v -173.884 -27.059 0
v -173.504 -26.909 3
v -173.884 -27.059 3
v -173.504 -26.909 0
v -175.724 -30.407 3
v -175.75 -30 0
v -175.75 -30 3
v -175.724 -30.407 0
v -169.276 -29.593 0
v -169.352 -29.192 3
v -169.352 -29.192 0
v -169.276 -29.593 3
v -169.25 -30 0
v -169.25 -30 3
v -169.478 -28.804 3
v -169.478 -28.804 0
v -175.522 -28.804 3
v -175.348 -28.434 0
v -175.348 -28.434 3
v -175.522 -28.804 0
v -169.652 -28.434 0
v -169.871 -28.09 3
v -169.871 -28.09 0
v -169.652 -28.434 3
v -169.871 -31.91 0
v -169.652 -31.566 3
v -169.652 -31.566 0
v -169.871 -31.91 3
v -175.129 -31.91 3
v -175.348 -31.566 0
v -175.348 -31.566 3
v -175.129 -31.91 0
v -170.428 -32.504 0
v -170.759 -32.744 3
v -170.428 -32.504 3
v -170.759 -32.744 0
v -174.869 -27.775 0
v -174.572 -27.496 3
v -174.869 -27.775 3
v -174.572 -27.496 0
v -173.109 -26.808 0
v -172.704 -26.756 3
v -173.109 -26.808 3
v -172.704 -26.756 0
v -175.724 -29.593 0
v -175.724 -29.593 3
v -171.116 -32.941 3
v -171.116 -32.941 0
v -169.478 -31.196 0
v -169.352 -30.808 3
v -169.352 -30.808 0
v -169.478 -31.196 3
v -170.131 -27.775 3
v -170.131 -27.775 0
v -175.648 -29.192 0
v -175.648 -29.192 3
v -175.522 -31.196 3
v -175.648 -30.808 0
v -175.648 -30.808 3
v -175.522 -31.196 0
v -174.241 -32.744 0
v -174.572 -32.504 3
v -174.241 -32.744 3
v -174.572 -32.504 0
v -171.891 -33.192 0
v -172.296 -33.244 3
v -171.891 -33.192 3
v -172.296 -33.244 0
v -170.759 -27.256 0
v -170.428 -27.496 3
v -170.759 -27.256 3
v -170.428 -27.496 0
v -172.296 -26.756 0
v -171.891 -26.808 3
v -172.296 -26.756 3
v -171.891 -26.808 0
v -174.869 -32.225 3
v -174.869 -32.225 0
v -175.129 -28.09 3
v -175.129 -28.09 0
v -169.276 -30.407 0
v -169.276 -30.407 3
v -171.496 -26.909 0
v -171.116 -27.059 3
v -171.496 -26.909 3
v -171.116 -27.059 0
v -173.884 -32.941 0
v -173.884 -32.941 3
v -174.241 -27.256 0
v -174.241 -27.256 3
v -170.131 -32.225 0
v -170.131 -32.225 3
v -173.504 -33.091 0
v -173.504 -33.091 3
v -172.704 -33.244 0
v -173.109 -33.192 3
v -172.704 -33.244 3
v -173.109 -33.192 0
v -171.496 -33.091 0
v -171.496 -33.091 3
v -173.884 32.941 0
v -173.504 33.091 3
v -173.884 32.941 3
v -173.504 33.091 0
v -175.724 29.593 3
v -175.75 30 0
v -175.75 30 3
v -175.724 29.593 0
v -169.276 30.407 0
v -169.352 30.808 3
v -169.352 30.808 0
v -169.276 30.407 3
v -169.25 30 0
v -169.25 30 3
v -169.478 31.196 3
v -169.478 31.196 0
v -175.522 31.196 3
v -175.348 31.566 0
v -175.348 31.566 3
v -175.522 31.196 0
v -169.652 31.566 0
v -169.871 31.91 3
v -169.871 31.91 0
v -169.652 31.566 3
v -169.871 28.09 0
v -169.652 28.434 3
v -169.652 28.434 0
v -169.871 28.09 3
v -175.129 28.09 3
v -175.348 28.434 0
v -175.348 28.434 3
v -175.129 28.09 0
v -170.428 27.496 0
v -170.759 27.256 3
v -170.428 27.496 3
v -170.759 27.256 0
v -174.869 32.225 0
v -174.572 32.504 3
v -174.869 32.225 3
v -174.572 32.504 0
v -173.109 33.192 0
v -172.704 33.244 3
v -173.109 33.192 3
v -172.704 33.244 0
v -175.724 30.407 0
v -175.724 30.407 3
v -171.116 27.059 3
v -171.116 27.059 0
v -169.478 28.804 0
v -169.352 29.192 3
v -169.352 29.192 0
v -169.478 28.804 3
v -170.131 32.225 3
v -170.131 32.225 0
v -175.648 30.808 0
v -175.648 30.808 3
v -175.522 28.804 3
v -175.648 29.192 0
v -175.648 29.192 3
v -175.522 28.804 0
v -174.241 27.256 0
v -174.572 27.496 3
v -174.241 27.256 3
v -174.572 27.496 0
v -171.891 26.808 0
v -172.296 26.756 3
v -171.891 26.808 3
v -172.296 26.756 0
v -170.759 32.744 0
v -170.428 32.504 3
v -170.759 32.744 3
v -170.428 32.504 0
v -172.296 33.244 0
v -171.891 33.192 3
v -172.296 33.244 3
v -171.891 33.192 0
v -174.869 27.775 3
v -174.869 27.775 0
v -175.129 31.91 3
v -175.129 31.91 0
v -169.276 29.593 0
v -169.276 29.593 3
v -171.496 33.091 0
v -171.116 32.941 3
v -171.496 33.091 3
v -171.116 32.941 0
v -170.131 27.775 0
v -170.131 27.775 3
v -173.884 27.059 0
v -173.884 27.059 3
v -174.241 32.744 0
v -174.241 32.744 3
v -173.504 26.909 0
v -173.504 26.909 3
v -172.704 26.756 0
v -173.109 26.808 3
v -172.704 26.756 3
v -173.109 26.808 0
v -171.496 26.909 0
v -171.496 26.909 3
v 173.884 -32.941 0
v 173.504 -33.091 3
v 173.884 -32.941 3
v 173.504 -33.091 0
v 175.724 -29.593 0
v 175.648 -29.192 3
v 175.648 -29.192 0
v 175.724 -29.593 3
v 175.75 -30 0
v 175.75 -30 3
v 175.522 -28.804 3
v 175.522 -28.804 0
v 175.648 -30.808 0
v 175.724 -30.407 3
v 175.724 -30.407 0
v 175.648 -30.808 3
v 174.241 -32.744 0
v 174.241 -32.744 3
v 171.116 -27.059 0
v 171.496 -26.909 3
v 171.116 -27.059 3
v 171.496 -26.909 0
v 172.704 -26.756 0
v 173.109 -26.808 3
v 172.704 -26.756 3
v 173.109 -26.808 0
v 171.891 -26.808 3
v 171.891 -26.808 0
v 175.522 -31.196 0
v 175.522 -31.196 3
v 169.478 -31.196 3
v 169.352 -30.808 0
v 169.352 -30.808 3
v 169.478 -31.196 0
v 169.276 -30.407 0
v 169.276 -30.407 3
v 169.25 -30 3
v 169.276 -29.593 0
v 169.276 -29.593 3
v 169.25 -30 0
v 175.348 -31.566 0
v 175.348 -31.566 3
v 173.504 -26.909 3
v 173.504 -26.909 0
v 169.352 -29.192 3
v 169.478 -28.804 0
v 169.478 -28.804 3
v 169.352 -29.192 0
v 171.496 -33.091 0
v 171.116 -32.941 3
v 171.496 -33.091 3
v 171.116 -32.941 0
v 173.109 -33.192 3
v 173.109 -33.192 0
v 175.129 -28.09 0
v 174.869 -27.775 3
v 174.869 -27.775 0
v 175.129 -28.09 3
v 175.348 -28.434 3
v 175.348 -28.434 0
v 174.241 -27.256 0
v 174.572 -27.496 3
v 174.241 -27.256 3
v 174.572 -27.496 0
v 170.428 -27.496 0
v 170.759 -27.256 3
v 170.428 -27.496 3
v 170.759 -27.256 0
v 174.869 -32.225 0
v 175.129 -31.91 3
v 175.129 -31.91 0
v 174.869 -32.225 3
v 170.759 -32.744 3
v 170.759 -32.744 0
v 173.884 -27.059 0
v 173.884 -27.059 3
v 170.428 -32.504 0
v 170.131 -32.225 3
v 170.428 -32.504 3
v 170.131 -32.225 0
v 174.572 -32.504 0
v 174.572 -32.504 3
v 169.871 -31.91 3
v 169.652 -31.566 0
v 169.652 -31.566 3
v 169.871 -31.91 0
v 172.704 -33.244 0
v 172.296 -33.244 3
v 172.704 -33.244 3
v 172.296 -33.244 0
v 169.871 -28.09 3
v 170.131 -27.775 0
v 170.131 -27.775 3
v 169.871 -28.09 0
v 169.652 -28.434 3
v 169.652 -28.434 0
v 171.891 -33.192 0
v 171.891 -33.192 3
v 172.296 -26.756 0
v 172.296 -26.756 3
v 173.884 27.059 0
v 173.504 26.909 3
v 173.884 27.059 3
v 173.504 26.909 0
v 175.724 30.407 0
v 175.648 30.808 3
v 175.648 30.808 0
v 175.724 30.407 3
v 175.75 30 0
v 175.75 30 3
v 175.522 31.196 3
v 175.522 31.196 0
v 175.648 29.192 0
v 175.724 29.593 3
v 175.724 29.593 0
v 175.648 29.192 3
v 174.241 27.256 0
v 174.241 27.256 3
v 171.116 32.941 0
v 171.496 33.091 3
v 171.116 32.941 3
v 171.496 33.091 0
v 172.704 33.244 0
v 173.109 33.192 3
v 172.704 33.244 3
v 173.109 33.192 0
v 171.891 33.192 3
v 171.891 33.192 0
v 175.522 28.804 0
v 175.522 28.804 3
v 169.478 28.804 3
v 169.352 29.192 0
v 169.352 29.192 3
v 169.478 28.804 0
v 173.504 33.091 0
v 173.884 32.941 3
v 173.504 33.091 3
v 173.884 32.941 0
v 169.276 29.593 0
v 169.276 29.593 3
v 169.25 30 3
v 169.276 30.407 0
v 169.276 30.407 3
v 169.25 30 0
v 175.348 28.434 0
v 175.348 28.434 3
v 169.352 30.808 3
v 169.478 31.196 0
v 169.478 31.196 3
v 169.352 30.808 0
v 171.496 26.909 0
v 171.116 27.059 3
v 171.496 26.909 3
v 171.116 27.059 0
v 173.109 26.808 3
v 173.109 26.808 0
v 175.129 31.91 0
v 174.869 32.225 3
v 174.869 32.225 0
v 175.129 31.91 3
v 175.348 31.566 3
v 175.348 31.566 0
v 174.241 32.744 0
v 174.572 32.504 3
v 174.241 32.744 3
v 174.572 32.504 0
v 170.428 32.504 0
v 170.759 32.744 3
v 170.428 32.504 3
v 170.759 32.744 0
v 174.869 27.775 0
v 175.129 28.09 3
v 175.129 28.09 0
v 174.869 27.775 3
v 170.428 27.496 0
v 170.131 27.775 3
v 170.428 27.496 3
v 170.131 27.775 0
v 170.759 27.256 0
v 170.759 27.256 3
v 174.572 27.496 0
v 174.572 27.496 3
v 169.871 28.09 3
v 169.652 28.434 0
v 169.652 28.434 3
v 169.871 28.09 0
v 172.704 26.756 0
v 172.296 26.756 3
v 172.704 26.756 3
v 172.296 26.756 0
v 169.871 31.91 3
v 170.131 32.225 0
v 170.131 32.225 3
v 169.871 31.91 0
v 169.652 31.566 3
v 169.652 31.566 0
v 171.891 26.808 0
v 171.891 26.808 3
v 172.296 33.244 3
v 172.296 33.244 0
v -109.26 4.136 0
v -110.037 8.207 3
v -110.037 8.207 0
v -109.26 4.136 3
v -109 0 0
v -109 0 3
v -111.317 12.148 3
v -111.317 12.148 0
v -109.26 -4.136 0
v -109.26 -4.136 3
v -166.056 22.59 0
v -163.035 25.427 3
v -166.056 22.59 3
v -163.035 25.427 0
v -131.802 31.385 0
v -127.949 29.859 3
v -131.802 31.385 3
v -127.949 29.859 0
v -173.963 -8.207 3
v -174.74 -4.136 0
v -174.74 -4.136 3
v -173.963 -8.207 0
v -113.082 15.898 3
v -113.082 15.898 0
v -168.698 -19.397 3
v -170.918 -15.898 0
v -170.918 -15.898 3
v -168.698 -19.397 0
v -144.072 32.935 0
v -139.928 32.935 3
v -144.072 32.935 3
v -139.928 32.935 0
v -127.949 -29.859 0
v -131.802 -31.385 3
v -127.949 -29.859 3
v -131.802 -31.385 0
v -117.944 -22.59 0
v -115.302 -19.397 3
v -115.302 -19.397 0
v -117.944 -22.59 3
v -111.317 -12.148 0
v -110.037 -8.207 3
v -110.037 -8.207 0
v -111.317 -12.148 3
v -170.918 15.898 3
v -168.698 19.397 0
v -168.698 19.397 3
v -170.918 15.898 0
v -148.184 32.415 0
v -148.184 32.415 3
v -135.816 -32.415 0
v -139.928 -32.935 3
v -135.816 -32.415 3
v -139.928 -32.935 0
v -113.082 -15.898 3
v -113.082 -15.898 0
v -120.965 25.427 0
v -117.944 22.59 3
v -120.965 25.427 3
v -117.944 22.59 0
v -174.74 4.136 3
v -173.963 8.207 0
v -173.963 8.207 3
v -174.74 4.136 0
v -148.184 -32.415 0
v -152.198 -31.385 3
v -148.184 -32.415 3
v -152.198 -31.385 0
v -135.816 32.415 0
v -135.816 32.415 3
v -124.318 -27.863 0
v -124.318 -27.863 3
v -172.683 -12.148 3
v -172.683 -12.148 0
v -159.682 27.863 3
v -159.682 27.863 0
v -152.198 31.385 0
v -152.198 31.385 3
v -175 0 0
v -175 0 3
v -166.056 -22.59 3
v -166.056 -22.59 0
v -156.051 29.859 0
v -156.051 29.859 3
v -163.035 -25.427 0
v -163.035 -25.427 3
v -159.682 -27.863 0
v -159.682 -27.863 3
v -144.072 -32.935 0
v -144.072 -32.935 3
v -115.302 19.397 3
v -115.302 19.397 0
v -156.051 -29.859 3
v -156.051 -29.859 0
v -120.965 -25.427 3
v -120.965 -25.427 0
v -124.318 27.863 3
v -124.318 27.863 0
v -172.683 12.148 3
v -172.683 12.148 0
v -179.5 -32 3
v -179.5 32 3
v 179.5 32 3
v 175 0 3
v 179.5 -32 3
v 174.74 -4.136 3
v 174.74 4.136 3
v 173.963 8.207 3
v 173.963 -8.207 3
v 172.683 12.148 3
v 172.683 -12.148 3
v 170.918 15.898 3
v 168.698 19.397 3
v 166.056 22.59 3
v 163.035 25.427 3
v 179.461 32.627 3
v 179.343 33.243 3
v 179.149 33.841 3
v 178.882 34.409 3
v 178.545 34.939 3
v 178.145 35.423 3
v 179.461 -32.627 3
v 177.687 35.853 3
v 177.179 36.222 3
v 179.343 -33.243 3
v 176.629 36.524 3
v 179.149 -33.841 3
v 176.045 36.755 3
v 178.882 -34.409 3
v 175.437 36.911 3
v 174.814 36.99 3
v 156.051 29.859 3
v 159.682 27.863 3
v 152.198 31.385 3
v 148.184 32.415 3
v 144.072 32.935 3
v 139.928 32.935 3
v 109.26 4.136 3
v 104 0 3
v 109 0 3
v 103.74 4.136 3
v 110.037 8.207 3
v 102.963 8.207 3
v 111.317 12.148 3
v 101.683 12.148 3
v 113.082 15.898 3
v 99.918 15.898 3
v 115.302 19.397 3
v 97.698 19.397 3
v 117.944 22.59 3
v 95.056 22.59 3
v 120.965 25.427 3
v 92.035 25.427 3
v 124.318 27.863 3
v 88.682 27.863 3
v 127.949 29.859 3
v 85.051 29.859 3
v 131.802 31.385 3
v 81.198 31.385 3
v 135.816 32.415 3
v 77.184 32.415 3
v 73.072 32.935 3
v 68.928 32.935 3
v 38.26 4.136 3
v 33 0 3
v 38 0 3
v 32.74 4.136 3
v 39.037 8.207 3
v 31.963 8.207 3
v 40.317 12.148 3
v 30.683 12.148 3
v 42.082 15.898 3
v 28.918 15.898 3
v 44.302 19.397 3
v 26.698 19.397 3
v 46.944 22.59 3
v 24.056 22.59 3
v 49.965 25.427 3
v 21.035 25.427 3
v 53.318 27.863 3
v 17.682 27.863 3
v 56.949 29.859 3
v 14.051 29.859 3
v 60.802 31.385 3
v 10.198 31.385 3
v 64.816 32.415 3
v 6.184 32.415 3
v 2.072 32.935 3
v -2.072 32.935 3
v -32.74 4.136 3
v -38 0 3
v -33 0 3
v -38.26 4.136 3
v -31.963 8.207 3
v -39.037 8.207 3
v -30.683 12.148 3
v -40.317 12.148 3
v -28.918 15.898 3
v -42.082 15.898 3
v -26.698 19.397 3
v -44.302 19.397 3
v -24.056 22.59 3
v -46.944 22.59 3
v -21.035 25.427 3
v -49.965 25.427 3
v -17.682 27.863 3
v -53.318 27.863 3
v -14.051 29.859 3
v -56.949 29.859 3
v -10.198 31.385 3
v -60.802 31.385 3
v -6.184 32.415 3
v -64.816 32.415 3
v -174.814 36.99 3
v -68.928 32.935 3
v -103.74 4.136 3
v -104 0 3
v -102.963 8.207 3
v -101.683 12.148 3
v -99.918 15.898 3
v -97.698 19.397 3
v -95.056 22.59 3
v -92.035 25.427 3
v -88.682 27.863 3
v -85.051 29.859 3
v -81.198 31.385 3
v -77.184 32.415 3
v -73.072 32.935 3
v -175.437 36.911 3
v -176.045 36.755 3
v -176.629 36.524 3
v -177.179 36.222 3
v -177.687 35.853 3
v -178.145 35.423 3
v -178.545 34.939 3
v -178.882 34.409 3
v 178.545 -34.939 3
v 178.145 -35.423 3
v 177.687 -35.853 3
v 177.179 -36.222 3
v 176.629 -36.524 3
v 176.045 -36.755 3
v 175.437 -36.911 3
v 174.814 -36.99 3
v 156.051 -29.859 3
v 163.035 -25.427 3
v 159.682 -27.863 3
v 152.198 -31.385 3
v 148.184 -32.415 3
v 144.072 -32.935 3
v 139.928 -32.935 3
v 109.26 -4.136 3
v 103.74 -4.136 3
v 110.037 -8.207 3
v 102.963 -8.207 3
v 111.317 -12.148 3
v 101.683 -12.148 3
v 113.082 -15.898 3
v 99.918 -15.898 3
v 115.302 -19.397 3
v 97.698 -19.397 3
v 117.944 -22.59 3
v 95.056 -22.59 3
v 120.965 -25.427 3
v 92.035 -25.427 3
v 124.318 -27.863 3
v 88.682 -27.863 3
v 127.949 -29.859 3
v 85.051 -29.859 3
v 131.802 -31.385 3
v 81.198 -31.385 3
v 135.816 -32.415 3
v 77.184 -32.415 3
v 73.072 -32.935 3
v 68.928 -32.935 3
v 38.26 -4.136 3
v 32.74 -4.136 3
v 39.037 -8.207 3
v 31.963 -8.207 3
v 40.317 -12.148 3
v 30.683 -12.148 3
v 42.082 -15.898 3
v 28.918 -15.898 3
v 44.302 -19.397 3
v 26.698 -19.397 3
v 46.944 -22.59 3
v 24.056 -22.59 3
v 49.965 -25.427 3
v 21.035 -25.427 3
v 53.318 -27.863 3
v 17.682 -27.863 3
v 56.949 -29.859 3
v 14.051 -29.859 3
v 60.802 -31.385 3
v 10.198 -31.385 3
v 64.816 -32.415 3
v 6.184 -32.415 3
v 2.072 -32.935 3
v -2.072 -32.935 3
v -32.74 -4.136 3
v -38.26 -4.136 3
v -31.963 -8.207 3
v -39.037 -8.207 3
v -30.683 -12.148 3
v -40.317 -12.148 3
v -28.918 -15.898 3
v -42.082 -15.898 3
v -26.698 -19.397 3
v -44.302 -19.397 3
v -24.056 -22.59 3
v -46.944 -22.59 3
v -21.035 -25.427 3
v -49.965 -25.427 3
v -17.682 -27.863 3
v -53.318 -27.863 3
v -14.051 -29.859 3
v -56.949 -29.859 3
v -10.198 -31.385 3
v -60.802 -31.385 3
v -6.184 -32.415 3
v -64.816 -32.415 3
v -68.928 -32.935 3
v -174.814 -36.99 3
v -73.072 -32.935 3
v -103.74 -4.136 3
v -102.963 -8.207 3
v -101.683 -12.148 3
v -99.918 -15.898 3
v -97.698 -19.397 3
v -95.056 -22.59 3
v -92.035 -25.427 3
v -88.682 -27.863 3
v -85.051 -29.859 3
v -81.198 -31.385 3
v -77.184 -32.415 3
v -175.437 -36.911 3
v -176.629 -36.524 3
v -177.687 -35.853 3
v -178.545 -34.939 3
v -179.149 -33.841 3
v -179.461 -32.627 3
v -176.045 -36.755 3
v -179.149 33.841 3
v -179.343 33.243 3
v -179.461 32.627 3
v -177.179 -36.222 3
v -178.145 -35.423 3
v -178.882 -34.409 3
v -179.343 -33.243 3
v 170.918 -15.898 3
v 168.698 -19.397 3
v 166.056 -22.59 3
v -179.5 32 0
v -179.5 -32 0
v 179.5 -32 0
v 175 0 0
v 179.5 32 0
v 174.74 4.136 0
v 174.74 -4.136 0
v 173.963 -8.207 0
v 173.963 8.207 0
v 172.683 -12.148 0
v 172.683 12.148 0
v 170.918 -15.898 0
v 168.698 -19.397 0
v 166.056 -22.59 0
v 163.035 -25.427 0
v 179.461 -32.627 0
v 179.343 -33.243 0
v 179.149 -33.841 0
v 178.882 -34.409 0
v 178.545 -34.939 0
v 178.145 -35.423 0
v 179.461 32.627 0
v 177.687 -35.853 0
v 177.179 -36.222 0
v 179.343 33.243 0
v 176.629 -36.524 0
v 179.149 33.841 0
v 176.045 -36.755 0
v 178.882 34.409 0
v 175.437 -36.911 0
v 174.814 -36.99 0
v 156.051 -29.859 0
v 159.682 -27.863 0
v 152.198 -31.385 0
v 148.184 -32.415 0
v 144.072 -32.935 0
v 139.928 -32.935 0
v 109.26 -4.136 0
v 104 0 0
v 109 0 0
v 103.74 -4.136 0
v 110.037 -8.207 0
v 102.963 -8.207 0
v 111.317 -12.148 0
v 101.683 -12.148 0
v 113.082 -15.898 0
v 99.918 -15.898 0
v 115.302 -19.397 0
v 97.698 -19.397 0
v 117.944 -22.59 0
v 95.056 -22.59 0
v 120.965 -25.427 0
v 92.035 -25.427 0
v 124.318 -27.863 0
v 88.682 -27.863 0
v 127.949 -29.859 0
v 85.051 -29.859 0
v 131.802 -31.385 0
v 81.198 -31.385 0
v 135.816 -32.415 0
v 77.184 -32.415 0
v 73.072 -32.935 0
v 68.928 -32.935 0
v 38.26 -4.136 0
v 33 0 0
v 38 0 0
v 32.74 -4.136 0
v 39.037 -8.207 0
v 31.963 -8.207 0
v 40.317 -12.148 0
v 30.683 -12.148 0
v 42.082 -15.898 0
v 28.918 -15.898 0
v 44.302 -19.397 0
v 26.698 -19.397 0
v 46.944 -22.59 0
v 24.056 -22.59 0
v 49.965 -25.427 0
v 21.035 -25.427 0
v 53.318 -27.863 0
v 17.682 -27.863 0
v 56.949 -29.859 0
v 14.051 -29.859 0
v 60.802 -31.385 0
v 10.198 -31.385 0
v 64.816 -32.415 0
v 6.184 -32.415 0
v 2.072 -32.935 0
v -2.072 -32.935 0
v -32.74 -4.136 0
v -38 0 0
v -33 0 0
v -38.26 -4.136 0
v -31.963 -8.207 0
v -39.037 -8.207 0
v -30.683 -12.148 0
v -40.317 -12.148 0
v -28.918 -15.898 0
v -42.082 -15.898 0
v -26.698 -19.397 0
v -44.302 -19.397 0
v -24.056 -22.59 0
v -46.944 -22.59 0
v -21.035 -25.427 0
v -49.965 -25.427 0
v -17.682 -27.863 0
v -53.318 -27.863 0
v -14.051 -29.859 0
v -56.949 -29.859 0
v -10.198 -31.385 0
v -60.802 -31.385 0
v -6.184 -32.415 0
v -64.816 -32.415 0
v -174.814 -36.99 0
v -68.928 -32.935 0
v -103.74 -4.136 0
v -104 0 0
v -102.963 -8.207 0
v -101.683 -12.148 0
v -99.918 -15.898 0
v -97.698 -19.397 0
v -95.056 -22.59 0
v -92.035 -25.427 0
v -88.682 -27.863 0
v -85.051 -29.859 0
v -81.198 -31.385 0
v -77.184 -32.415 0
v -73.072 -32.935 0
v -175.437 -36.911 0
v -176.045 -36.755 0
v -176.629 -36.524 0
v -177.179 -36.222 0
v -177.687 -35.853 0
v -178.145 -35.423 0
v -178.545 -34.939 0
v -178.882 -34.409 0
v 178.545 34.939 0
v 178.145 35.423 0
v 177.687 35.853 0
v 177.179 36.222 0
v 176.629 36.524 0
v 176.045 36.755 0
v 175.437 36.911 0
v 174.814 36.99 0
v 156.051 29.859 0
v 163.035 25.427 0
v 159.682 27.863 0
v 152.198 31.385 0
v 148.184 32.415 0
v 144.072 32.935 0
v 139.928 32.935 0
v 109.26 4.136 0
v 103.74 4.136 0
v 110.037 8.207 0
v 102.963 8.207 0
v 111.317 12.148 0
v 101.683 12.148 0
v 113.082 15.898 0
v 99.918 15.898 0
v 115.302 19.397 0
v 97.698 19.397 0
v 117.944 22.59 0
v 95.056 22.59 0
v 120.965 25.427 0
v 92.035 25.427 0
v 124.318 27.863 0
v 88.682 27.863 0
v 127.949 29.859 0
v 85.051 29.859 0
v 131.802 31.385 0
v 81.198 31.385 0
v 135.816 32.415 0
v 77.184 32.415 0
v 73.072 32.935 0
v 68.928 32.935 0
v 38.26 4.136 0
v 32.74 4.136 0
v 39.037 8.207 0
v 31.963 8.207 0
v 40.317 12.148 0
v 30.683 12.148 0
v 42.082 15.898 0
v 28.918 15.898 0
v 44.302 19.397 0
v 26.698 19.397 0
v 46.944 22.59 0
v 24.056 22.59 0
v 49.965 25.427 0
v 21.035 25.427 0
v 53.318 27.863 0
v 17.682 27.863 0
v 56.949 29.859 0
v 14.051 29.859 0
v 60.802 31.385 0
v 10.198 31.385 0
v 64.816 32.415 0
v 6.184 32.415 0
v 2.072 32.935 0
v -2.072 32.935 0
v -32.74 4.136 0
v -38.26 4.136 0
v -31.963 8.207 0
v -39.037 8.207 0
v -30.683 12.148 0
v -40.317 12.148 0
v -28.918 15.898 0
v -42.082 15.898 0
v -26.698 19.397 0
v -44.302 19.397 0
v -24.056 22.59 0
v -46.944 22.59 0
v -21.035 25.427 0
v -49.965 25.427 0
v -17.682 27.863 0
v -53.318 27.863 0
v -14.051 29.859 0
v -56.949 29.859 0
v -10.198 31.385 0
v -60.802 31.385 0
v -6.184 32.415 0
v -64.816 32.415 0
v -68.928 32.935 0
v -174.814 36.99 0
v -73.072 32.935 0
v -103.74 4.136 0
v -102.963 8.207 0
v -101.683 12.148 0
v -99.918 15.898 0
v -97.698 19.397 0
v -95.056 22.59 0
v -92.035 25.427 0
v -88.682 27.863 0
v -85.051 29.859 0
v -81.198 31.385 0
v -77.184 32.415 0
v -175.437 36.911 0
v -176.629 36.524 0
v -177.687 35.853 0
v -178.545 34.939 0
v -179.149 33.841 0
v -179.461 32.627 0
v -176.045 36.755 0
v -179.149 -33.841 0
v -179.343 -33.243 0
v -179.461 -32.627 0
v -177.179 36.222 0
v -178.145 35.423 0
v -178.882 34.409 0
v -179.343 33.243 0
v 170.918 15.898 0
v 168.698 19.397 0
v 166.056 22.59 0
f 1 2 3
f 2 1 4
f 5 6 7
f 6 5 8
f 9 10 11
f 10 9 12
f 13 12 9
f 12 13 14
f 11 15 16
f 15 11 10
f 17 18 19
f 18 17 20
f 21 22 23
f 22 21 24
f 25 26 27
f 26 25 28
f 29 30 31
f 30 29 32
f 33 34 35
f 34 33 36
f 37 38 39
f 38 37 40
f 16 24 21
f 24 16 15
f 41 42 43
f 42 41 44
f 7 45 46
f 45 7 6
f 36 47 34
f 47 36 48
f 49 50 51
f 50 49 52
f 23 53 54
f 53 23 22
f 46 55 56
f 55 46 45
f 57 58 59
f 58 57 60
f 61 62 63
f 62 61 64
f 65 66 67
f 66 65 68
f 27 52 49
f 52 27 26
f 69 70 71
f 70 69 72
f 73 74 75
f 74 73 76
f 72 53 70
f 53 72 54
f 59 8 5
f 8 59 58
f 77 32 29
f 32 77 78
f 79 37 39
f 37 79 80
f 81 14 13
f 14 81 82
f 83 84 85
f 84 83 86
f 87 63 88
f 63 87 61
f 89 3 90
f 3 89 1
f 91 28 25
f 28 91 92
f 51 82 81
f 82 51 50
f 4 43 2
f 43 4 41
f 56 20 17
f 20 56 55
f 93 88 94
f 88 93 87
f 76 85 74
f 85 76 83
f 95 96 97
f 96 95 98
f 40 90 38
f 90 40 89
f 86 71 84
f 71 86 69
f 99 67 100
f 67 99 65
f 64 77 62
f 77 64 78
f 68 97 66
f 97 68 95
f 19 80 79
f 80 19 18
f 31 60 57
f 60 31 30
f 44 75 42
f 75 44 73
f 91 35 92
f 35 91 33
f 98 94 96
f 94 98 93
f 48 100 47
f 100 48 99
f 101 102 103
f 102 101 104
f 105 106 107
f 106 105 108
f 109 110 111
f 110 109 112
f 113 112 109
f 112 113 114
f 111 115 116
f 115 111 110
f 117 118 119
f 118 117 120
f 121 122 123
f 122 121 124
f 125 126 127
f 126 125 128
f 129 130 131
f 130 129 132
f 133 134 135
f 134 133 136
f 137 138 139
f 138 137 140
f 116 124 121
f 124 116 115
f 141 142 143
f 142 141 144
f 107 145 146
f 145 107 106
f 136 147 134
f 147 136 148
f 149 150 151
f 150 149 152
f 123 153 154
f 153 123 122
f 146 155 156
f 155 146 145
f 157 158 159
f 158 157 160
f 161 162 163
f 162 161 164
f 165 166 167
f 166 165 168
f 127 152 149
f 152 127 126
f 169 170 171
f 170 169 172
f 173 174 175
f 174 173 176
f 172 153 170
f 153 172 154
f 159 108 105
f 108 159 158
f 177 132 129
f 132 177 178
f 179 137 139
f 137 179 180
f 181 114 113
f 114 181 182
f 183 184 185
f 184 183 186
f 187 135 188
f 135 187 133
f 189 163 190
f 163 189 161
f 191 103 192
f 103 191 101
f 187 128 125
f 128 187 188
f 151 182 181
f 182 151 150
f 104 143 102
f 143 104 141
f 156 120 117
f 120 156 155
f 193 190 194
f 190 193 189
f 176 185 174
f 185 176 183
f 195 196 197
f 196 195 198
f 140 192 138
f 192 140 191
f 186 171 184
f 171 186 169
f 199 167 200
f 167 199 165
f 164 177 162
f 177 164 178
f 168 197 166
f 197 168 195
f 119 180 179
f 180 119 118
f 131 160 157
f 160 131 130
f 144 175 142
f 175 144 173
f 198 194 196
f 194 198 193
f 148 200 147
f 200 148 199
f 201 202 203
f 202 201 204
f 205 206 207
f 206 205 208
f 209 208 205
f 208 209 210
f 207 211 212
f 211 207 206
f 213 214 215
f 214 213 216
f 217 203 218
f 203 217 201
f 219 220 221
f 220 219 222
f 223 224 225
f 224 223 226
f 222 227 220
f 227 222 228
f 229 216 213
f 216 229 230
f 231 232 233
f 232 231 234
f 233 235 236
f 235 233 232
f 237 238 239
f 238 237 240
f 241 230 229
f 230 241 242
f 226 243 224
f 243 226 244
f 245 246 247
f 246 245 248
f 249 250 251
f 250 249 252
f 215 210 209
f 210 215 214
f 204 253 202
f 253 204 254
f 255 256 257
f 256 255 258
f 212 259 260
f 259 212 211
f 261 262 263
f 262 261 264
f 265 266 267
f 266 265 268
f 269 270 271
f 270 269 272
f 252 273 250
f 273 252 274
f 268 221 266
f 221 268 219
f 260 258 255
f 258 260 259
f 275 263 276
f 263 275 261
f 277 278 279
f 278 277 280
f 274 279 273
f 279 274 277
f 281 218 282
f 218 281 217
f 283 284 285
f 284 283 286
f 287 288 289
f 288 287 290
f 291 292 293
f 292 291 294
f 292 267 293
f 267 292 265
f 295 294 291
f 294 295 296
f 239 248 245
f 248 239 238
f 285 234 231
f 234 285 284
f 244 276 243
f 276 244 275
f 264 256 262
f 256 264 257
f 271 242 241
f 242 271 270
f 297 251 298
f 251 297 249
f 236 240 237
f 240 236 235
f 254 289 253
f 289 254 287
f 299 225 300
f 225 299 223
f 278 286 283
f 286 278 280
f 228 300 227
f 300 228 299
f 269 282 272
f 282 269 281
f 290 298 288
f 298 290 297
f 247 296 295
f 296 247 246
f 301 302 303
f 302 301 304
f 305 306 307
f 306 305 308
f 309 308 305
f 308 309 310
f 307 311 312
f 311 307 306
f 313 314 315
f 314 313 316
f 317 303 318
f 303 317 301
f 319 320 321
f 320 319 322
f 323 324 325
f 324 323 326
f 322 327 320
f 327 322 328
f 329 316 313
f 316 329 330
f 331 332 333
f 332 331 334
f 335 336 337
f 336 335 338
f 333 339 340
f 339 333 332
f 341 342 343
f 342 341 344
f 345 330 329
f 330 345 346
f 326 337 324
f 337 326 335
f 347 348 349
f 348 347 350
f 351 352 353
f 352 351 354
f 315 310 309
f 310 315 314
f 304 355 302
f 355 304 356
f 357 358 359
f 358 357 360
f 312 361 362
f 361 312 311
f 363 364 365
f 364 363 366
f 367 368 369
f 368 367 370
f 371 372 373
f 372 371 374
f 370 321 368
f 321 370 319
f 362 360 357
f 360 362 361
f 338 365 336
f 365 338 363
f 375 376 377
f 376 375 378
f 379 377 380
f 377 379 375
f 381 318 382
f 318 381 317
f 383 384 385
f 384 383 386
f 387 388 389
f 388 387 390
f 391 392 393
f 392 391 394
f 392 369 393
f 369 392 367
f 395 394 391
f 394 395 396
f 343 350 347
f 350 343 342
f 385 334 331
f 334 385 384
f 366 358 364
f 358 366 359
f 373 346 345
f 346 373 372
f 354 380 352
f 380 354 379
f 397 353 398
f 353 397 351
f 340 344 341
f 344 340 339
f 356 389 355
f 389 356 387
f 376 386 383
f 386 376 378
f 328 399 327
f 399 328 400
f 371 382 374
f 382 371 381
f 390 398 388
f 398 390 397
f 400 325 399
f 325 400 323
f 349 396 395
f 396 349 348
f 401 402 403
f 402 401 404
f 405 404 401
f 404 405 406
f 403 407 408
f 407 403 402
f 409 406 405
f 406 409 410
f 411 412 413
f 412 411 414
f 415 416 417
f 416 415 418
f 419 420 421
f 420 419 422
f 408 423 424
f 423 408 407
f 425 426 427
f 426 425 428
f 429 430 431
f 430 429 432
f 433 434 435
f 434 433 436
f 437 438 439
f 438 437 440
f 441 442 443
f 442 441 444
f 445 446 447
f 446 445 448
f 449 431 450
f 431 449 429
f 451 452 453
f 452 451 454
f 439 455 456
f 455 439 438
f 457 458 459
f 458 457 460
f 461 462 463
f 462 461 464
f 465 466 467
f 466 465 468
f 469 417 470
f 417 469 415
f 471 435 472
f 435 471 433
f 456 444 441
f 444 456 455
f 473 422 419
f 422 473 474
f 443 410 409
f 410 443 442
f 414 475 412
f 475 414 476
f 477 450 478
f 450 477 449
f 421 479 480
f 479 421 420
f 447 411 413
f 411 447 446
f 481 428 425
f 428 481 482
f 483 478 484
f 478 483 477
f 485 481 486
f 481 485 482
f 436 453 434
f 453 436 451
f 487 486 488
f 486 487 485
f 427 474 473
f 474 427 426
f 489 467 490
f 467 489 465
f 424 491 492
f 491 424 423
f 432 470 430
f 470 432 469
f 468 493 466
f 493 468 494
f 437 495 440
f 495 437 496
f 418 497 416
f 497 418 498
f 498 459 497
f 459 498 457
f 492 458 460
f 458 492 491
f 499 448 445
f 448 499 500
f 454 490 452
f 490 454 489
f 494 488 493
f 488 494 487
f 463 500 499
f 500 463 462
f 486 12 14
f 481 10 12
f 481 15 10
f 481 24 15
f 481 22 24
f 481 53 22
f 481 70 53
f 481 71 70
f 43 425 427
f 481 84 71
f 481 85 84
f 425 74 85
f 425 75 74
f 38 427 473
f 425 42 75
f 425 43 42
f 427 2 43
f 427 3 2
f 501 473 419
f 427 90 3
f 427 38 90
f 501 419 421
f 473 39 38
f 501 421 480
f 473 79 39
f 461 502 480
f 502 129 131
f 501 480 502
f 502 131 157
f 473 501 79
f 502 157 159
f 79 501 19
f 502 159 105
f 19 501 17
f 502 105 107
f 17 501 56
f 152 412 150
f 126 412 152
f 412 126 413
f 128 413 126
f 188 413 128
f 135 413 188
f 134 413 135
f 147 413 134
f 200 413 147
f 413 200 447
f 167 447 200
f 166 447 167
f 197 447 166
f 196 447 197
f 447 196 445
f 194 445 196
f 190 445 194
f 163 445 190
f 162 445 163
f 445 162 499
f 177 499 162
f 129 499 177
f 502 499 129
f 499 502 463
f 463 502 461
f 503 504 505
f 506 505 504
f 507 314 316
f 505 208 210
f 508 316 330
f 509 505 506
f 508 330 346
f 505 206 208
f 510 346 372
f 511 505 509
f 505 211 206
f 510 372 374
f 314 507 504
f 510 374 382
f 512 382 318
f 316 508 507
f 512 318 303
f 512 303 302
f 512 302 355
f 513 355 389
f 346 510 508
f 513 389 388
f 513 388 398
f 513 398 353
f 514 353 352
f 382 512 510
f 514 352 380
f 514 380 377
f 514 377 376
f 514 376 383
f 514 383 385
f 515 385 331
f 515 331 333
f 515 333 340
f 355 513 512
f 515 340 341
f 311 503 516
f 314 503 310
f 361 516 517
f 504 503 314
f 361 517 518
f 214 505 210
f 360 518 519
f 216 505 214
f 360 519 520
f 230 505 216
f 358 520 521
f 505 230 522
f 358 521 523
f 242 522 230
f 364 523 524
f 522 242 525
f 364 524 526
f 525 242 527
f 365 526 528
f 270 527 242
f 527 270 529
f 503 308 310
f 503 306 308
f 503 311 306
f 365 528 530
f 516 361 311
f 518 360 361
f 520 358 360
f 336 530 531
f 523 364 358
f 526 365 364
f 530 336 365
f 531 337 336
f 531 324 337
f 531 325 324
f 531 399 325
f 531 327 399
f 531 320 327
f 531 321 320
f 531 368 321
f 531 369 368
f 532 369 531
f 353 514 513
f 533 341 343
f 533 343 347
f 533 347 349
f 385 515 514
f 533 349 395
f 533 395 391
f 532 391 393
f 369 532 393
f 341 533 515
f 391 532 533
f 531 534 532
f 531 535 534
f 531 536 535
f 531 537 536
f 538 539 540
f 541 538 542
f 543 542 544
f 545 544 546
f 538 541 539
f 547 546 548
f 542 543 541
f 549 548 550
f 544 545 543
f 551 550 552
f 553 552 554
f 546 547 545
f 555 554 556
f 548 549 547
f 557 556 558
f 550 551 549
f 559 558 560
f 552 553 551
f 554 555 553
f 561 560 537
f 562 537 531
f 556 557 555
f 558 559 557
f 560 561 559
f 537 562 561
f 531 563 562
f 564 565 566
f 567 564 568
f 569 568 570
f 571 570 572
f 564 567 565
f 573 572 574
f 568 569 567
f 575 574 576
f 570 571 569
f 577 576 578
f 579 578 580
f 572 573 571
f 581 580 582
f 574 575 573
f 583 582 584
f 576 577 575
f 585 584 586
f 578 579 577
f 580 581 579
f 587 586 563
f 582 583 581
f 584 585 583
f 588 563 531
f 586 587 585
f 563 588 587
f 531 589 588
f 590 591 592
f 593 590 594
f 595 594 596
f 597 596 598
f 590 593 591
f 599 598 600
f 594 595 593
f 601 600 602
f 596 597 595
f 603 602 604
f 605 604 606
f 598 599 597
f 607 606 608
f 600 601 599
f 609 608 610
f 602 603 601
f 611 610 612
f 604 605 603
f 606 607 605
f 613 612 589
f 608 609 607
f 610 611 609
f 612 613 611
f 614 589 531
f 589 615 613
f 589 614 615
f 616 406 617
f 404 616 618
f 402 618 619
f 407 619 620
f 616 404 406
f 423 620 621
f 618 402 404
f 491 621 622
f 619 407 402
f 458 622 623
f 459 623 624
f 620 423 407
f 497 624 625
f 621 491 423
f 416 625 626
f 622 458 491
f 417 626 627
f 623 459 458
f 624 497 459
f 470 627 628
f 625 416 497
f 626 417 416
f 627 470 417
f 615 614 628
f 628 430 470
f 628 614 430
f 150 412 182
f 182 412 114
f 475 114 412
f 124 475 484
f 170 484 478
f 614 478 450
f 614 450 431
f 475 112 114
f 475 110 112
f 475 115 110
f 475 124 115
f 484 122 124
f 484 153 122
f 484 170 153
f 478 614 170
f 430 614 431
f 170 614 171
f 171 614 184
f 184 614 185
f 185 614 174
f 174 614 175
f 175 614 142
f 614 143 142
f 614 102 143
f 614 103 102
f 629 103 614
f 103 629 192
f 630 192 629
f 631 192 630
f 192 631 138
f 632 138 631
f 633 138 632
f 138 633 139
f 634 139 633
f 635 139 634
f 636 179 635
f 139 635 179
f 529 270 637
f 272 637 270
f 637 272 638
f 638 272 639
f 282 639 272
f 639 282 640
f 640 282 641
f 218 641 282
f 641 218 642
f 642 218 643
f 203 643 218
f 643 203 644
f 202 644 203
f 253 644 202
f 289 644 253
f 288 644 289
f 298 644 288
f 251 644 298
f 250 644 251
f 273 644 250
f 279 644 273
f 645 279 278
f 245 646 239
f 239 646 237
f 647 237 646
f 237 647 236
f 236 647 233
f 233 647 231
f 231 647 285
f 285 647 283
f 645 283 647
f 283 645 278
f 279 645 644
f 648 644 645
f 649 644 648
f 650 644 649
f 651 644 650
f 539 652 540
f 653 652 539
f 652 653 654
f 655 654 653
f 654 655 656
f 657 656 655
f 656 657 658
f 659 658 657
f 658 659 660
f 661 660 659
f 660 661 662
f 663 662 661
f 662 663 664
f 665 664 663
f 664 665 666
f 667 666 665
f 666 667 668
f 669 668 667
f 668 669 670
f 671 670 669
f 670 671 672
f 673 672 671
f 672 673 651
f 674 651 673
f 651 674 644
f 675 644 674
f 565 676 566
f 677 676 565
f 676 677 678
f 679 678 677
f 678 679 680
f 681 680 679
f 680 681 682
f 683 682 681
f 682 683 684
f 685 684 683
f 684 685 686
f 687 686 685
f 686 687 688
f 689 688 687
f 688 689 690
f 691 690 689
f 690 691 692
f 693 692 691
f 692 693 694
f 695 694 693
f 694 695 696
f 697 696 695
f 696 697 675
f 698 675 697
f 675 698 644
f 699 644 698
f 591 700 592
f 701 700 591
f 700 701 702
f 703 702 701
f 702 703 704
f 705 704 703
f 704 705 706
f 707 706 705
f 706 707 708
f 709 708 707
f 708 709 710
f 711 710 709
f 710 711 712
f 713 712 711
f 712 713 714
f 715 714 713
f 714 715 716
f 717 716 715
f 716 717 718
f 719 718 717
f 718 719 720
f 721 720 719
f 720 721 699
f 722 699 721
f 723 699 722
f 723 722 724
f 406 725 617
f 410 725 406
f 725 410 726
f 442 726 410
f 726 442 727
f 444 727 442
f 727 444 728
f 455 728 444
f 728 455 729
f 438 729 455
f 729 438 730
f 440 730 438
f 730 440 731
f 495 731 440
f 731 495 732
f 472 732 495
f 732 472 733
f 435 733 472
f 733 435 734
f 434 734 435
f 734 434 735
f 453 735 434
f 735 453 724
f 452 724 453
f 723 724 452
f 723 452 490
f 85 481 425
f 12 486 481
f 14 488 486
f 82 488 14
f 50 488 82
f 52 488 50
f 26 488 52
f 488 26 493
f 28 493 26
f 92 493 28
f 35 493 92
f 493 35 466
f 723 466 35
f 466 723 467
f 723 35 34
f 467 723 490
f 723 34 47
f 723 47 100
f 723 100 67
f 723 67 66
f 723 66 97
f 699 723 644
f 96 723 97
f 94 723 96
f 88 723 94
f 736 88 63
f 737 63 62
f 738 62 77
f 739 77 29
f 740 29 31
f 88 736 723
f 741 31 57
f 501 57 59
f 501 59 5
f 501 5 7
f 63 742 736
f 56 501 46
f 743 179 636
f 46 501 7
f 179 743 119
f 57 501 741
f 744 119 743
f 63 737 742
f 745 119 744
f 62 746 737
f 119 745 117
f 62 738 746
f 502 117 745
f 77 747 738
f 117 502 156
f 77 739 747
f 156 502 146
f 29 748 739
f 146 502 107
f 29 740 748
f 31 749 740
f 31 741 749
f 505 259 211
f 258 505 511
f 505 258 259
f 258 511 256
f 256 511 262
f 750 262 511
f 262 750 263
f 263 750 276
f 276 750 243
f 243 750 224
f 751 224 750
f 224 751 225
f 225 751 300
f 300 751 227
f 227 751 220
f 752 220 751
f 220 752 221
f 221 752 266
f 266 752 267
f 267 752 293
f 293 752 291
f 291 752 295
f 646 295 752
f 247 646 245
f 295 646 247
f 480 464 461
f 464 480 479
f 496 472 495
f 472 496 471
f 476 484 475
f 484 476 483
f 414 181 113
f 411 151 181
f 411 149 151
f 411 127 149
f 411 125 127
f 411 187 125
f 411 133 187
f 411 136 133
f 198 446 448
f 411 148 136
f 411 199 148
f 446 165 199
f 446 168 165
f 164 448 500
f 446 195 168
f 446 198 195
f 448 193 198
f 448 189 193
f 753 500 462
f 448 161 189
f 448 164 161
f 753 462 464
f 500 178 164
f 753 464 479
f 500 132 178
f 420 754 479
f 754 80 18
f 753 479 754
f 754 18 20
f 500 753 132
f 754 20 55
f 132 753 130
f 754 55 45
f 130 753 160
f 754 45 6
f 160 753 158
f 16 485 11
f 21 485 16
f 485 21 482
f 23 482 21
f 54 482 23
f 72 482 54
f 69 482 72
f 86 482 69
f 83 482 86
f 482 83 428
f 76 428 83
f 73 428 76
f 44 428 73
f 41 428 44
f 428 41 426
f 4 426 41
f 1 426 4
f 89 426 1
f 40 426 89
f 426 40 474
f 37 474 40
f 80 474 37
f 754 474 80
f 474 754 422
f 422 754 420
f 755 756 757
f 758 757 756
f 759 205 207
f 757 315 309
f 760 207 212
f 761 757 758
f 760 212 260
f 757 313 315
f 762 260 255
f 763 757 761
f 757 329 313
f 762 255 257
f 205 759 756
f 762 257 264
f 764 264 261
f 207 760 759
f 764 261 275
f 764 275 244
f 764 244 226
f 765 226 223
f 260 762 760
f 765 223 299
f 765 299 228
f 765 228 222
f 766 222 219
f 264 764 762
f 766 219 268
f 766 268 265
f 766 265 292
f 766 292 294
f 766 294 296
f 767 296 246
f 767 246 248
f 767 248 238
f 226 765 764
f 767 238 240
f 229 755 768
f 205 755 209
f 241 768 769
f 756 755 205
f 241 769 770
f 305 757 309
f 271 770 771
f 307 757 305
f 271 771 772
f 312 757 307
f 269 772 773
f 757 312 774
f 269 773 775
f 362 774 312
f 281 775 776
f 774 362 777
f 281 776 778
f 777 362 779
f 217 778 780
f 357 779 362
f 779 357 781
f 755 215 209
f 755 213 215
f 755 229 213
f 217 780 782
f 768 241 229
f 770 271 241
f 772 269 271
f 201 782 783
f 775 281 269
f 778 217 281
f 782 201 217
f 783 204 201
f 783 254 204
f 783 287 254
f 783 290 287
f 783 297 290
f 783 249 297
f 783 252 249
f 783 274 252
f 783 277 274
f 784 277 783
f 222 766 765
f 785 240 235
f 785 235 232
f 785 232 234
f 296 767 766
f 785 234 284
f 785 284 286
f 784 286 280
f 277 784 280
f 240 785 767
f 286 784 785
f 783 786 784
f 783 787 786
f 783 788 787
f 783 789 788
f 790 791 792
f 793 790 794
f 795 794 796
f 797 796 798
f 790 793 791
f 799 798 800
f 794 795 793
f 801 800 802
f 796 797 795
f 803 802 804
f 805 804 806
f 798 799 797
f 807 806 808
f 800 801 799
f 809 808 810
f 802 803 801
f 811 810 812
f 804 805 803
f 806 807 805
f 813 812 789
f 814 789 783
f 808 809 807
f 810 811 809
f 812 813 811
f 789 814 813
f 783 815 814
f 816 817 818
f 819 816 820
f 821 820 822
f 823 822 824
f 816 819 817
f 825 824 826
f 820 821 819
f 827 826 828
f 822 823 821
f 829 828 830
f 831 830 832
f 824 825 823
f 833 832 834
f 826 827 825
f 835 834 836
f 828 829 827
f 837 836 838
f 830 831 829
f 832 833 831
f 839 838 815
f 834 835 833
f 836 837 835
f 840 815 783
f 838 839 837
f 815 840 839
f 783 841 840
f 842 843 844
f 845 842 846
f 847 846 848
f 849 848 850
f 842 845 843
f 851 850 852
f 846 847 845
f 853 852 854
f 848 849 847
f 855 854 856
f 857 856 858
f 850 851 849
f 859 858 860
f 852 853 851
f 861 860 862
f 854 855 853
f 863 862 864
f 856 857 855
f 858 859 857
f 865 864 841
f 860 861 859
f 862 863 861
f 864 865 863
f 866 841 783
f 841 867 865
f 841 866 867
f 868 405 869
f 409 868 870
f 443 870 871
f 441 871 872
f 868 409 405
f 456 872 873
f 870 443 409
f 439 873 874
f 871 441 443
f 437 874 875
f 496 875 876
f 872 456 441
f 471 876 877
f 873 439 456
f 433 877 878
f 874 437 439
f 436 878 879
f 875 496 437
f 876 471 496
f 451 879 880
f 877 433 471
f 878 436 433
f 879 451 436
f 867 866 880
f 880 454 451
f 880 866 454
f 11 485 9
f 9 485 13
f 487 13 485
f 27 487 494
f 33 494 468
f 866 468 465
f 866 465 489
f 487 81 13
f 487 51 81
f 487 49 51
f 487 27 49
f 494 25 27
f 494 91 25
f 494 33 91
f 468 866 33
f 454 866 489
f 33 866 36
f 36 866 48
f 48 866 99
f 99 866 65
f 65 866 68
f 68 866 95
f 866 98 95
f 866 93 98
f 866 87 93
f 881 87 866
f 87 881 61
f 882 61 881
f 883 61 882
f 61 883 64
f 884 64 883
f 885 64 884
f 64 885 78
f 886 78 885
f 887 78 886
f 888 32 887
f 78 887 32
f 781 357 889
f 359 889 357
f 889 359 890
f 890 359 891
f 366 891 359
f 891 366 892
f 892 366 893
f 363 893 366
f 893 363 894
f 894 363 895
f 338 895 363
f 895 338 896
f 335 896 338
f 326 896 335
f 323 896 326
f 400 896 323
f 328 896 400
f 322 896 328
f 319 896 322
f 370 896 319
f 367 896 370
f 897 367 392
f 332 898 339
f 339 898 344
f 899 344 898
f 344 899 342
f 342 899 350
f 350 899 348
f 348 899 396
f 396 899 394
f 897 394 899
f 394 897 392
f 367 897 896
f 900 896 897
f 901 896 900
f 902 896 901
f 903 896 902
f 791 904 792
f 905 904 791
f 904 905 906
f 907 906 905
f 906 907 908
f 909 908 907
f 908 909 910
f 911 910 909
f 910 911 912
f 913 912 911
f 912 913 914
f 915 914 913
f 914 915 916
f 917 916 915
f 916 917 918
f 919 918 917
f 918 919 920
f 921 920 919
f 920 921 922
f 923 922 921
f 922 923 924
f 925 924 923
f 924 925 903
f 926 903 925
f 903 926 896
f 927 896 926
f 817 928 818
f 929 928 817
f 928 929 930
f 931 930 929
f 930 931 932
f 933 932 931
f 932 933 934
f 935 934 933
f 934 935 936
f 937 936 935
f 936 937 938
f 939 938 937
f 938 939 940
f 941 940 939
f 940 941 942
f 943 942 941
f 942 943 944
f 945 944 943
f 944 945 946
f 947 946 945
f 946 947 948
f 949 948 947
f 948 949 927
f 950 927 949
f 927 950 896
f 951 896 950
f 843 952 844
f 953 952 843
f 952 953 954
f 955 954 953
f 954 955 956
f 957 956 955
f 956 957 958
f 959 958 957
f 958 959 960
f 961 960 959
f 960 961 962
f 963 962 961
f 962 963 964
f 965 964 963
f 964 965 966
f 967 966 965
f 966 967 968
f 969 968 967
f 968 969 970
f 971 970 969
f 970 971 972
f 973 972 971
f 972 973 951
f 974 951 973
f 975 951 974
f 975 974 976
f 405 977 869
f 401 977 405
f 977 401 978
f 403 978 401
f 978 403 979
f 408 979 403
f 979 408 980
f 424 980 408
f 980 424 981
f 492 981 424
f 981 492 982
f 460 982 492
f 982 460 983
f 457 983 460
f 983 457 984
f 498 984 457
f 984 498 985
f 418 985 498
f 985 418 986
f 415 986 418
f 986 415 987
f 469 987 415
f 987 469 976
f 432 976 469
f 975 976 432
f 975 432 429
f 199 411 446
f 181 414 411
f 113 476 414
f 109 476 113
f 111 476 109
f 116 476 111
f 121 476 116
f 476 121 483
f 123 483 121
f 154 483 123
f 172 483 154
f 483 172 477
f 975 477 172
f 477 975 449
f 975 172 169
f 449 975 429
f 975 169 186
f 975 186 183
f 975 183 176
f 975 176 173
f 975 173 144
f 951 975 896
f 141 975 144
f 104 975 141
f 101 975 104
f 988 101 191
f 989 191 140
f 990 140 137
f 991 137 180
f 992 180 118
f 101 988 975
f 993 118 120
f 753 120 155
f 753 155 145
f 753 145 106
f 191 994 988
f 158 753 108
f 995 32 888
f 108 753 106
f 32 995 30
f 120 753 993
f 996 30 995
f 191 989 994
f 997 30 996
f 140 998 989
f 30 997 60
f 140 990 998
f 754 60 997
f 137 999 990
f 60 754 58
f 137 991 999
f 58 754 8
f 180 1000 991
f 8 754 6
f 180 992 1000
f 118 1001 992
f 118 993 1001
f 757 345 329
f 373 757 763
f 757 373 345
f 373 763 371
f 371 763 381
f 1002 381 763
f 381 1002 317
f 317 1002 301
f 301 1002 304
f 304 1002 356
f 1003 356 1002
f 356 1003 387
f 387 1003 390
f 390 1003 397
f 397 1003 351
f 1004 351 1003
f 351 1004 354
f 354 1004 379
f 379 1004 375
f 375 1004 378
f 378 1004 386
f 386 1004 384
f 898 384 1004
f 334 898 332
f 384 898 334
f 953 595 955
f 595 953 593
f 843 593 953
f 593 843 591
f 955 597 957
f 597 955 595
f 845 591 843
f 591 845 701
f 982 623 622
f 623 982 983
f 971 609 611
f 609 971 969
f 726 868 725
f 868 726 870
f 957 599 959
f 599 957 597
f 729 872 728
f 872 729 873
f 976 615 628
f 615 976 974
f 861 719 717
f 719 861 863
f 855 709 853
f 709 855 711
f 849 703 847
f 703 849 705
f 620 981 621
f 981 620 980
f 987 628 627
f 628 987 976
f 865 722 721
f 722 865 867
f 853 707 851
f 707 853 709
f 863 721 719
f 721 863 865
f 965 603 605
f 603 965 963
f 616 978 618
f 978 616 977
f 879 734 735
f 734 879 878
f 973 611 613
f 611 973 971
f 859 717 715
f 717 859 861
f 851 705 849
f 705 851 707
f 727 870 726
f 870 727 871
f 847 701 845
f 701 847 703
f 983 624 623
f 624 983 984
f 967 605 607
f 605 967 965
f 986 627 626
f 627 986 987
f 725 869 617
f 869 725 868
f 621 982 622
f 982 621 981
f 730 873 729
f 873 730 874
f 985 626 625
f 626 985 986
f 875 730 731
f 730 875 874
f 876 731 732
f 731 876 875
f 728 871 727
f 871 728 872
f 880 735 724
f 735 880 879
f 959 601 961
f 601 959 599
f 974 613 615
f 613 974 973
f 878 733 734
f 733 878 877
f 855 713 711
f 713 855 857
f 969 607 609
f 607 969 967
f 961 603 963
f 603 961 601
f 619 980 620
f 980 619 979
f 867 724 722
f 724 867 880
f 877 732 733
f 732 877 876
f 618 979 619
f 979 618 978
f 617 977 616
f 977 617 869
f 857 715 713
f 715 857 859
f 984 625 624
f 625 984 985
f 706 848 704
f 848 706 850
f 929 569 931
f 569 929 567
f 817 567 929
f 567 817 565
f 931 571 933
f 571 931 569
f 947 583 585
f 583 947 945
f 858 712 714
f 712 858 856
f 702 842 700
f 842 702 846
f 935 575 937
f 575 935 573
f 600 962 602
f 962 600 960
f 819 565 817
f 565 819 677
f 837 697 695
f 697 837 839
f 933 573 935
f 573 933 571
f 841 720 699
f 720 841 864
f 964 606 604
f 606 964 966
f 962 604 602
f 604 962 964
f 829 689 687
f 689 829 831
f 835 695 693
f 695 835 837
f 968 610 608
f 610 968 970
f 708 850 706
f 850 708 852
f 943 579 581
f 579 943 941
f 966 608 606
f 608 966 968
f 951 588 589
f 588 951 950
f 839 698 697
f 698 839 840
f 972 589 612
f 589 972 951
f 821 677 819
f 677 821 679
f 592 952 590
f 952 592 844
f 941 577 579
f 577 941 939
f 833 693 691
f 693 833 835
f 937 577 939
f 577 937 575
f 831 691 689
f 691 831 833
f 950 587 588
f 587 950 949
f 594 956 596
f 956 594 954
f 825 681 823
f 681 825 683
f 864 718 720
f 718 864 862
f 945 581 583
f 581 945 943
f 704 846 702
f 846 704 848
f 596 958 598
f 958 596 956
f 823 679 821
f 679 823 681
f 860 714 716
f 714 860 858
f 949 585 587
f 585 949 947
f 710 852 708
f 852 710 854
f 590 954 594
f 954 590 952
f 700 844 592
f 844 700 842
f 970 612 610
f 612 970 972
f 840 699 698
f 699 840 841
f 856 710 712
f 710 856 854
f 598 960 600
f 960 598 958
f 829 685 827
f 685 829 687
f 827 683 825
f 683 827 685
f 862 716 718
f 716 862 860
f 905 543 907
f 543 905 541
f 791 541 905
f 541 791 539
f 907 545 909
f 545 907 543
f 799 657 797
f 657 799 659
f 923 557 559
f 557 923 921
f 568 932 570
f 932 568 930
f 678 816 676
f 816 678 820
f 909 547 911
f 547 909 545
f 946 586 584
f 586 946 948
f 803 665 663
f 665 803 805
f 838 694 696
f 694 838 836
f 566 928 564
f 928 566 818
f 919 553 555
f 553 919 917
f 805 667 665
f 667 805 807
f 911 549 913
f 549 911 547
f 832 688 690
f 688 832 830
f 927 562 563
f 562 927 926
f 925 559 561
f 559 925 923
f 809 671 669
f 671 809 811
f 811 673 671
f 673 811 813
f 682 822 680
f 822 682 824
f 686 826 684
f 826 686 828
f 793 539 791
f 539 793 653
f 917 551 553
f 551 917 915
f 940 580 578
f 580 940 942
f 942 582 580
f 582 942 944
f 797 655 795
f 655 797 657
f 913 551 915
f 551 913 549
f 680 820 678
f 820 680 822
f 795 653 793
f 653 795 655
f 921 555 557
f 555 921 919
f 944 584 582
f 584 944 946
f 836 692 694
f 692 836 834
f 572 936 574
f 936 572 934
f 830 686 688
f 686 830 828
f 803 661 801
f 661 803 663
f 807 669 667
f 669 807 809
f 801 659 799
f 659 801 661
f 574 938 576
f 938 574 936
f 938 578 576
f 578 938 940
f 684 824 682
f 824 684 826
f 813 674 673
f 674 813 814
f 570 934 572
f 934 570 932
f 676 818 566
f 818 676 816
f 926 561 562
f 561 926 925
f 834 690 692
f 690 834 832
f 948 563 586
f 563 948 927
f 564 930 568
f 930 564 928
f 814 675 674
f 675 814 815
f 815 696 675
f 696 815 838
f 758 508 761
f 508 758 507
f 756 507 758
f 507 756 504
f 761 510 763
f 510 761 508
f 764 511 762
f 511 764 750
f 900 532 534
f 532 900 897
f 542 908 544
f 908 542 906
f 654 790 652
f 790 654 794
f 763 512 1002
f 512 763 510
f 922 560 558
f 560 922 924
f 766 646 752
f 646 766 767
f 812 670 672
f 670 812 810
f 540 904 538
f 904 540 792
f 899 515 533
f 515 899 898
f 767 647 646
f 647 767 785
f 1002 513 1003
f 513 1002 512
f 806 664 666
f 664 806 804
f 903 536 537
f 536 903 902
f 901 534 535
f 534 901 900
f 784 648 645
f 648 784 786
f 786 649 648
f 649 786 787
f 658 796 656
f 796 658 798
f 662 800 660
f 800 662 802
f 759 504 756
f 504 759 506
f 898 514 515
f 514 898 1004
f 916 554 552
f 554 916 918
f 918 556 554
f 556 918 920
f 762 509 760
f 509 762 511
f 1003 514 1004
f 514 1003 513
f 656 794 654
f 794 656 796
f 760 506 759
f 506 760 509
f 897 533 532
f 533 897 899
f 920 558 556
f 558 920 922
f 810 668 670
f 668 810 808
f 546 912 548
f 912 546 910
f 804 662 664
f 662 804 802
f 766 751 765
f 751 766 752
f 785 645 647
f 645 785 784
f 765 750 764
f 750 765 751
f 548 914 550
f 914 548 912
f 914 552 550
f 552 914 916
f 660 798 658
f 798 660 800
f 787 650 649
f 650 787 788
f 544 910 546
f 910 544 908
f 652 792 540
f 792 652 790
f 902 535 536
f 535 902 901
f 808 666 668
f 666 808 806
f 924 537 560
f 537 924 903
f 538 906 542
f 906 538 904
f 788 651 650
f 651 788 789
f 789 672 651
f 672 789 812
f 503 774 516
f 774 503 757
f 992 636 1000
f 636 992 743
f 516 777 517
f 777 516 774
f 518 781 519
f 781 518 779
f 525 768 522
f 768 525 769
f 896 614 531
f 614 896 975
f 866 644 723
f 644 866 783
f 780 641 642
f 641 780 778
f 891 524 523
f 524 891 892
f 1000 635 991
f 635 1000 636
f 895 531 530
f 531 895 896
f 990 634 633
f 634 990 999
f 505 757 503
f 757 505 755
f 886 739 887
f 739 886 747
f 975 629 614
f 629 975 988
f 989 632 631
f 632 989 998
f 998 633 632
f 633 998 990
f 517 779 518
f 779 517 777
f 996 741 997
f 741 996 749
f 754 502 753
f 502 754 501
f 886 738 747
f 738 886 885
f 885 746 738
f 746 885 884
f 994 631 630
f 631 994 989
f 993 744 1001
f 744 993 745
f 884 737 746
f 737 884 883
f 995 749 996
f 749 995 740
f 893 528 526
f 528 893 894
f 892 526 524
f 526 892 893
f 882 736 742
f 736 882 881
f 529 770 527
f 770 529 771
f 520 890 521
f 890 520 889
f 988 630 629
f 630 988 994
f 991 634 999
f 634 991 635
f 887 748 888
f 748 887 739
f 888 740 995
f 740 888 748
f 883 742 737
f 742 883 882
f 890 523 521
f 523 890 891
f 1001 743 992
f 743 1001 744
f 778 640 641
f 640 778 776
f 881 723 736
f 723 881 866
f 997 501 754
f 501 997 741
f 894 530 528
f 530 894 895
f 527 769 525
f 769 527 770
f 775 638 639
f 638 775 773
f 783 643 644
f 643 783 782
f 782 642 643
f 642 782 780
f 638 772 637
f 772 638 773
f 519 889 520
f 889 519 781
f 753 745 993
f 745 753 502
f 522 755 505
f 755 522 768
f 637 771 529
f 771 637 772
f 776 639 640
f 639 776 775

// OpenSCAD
$fn = 50;

difference() {
	union() {
		hull() {
			translate(v = [-174.5, 32.0, 0]) {
				cylinder(h = 3, r = 5);
			}
			translate(v = [174.5, 32.0, 0]) {
				cylinder(h = 3, r = 5);
			}
			translate(v = [-174.5, -32.0, 0]) {
				cylinder(h = 3, r = 5);
			}
			translate(v = [174.5, -32.0, 0]) {
				cylinder(h = 3, r = 5);
			}
		}
	}
	union() {
		translate(v = [-172.5, -30.0, -100.0]) {
			cylinder(h = 200, r = 3.25);
		}
		translate(v = [-172.5, 30.0, -100.0]) {
			cylinder(h = 200, r = 3.25);
		}
		translate(v = [172.5, -30.0, -100.0]) {
			cylinder(h = 200, r = 3.25);
		}
		translate(v = [172.5, 30.0, -100.0]) {
			cylinder(h = 200, r = 3.25);
		}
		translate(v = [-172.5, -30.0, -100.0]) {
			cylinder(h = 200, r = 1.8);
		}
		translate(v = [-172.5, 30.0, -100.0]) {
			cylinder(h = 200, r = 1.8);
		}
		translate(v = [172.5, -30.0, -100.0]) {
			cylinder(h = 200, r = 1.8);
		}
		translate(v = [172.5, 30.0, -100.0]) {
			cylinder(h = 200, r = 1.8);
		}
		translate(v = [-142.0, 0, 0.0]) {
			cylinder(h = 3, r = 33.0);
		}
		translate(v = [-71.0, 0, 0.0]) {
			cylinder(h = 3, r = 33.0);
		}
		cylinder(h = 3, r = 33.0);
		translate(v = [71.0, 0, 0.0]) {
			cylinder(h = 3, r = 33.0);
		}
		translate(v = [142.0, 0, 0.0]) {
			cylinder(h = 3, r = 33.0);
		}
	}
}
